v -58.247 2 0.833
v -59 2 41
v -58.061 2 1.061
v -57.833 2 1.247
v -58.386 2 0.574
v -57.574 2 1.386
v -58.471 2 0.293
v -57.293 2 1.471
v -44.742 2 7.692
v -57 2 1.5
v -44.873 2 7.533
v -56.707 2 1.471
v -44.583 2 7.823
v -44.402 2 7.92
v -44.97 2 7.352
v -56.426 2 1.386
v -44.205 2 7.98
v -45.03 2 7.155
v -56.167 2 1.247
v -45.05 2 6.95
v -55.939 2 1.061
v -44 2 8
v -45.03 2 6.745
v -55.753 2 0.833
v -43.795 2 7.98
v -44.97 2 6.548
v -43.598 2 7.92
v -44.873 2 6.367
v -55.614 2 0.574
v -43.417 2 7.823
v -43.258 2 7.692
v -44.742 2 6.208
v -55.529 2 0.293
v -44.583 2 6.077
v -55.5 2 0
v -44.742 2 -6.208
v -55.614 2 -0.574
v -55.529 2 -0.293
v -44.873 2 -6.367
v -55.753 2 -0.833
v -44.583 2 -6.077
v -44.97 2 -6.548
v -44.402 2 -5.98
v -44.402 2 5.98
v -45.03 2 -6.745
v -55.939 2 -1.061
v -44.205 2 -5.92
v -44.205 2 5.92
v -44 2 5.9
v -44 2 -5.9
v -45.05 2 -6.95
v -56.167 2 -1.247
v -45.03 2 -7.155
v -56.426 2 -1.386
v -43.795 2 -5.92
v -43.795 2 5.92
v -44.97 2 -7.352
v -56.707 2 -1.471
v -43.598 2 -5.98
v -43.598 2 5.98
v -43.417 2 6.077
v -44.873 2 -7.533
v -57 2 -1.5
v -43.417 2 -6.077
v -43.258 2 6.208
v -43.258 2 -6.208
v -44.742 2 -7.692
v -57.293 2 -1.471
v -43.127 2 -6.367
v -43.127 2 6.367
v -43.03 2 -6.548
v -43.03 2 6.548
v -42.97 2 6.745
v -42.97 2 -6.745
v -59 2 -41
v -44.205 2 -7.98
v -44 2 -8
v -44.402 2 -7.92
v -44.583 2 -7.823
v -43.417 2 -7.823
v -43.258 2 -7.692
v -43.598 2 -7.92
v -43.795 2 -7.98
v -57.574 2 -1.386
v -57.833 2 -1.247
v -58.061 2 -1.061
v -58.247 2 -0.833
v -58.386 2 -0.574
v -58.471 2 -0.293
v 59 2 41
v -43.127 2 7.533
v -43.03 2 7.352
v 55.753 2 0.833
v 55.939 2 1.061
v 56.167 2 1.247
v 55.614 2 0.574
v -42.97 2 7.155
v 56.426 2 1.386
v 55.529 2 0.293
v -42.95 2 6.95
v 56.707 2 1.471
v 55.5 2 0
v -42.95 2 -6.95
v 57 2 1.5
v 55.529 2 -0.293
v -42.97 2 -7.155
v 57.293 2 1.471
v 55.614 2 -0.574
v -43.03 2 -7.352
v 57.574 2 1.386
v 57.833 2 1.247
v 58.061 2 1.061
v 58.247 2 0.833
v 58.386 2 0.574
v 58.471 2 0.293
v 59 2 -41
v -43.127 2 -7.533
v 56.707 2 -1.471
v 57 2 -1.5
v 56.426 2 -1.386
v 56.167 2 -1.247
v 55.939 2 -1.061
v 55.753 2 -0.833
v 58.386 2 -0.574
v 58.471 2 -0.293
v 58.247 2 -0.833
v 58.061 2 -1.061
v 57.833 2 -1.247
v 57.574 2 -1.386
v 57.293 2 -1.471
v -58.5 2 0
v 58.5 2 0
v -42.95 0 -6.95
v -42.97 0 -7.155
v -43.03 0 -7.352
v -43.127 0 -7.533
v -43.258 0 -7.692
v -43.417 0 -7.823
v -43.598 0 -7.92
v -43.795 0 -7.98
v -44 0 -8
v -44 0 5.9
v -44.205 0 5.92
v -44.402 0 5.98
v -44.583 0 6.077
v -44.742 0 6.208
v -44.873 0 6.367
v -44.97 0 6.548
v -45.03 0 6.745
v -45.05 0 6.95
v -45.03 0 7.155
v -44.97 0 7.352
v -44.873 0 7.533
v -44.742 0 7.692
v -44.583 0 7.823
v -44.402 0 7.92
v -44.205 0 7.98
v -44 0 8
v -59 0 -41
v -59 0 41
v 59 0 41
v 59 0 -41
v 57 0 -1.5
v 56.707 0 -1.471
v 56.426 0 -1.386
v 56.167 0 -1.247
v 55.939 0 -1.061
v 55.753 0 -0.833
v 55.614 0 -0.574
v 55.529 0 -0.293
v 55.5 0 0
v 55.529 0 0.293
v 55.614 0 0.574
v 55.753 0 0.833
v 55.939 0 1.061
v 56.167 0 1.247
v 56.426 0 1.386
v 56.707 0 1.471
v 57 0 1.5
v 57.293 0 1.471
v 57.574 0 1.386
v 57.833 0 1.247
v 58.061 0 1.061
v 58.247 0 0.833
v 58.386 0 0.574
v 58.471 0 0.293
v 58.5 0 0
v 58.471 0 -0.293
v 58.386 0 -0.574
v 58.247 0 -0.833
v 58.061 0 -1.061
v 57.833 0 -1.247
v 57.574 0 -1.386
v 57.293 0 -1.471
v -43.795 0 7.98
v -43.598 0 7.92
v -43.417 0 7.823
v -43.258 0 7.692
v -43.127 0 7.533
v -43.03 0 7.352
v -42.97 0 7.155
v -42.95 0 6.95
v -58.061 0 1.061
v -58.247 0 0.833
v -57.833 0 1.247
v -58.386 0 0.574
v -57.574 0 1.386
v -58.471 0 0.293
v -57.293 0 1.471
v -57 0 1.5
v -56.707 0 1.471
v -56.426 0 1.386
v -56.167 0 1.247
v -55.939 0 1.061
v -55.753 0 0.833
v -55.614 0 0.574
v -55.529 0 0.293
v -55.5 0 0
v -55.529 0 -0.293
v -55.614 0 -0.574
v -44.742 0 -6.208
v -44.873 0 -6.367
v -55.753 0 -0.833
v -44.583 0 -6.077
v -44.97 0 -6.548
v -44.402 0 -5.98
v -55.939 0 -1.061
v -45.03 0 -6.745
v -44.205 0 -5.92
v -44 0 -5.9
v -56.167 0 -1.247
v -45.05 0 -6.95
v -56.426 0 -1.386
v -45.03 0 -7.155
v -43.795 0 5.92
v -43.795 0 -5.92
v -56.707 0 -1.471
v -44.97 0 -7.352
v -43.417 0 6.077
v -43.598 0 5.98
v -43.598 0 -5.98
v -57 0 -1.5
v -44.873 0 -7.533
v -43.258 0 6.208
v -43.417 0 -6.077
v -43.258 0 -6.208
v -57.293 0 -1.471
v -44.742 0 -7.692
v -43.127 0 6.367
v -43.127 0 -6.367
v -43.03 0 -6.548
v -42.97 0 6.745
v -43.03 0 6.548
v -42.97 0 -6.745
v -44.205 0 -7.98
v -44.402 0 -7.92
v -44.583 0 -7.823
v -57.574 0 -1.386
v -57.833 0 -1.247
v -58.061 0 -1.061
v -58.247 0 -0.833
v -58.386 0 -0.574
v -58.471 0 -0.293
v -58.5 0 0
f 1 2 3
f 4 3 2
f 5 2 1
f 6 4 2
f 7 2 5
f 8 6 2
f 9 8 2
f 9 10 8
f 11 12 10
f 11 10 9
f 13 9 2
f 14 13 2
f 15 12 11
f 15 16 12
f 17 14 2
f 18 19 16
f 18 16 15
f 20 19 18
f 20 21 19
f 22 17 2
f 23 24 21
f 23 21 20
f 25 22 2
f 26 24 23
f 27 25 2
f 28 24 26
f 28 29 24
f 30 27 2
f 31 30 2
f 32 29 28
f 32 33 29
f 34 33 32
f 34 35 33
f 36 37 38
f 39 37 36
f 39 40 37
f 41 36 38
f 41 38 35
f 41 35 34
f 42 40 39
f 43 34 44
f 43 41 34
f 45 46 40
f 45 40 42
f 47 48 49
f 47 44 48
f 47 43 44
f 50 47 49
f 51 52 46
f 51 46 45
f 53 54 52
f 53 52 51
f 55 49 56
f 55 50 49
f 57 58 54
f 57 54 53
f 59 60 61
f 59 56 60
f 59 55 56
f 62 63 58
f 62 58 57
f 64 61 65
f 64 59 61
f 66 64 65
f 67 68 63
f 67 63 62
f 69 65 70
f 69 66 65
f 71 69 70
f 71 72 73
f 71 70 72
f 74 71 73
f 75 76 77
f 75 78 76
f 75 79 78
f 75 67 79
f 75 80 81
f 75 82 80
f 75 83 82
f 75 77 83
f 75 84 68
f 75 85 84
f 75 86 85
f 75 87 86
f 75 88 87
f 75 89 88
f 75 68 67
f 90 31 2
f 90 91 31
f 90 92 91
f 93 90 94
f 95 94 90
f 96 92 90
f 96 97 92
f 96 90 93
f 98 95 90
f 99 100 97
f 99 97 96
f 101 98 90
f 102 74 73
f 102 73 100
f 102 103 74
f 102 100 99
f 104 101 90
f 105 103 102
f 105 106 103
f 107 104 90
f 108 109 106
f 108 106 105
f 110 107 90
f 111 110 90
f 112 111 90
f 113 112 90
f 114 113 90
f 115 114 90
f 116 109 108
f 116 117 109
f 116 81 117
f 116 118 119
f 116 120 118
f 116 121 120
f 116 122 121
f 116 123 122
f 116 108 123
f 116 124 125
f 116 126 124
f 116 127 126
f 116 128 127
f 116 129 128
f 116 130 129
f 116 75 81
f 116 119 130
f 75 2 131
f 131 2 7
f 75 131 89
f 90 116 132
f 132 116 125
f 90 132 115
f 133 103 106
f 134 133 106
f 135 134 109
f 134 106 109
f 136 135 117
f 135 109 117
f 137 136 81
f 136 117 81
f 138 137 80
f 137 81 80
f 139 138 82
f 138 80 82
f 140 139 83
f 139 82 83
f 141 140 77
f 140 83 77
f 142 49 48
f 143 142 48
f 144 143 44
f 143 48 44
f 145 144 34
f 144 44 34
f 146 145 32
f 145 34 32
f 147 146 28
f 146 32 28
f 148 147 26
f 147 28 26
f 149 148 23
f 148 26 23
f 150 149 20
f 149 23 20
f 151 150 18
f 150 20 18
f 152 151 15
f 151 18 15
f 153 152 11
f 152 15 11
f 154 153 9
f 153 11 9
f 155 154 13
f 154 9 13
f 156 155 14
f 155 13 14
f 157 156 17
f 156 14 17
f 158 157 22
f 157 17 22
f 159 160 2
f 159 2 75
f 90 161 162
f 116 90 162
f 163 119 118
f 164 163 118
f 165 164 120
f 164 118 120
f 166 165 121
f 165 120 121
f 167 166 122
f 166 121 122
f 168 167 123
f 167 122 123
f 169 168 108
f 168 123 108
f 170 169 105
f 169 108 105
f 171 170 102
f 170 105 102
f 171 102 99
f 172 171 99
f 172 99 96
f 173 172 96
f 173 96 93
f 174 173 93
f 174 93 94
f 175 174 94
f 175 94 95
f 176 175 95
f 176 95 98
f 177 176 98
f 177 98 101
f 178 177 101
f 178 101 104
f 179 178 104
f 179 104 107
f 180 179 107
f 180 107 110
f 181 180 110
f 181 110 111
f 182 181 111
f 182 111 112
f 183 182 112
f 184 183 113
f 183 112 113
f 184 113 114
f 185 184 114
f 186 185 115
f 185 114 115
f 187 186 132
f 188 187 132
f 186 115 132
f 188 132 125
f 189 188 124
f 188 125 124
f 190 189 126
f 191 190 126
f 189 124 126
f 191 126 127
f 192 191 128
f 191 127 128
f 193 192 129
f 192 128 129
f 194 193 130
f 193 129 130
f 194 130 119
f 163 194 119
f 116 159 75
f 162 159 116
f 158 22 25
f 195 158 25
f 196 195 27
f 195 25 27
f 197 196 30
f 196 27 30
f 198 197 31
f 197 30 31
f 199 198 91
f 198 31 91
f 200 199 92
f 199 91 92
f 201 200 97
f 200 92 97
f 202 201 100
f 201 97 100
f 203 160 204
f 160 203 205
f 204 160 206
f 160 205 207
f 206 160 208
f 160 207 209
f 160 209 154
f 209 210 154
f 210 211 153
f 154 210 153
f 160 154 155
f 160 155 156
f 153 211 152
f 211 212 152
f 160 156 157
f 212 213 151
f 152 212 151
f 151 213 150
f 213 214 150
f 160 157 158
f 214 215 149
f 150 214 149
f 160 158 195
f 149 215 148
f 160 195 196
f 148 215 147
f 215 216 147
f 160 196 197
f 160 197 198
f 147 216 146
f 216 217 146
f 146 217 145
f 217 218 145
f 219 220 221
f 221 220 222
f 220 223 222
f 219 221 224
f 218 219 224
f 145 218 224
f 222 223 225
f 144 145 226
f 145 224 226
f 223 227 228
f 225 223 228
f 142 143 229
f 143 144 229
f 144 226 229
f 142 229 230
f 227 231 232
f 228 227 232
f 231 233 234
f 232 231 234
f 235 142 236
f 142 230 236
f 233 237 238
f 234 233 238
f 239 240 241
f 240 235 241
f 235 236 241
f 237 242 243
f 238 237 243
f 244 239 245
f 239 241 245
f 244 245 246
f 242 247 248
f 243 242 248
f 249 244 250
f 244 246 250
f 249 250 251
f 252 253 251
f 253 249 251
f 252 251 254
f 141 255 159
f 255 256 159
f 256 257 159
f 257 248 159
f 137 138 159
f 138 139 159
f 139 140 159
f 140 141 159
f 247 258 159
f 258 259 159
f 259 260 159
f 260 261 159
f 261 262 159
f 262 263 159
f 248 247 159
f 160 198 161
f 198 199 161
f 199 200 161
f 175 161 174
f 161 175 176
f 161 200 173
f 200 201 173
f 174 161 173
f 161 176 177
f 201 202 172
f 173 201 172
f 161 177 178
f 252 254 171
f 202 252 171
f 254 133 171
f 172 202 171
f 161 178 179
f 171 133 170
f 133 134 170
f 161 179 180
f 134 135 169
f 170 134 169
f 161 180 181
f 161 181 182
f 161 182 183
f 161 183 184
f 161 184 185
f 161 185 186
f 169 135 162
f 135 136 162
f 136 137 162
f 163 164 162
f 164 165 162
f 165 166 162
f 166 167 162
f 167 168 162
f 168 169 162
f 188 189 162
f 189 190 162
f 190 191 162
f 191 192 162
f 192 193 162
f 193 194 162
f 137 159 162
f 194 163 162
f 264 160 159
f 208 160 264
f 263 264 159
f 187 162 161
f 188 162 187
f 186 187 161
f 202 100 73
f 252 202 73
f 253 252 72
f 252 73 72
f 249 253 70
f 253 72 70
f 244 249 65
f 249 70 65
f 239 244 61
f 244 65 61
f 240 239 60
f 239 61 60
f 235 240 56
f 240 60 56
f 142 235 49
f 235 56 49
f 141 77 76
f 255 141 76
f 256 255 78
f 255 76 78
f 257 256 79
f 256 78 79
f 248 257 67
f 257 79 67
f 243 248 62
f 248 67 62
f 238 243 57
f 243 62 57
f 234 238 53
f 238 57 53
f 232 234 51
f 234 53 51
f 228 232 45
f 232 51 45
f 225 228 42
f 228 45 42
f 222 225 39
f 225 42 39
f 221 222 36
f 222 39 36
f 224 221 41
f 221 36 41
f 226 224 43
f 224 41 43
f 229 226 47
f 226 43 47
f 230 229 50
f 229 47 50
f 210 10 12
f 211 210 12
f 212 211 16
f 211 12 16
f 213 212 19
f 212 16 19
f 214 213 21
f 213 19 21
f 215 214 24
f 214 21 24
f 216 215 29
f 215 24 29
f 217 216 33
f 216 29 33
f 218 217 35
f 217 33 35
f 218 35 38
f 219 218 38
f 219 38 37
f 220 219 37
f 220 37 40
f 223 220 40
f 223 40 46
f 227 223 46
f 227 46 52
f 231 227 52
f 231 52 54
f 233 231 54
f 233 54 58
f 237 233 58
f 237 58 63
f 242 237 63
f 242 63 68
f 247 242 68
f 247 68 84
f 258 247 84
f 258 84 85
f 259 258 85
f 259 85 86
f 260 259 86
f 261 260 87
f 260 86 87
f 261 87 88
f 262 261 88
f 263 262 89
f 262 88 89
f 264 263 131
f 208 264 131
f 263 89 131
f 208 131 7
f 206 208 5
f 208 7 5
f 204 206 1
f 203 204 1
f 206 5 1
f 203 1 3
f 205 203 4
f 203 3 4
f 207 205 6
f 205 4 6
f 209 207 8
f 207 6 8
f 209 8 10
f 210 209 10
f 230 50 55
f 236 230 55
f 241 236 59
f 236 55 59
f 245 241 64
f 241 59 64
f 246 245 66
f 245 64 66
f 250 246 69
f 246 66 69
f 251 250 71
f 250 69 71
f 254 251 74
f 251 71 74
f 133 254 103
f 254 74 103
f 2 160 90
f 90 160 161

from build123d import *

# Parameters (mm, degrees)
SKETCH1_W           = 118
SKETCH1_H           = 82
BOSS_EXTRUDE1_DEPTH = 2
CUT_EXTRUDE1_DEPTH  = 2
SKETCH3_R           = 1.5
CUT_EXTRUDE2_DEPTH  = 10


with BuildPart() as part:
    # Sketch1 → Boss-Extrude1 (new body)
    with BuildSketch(Plane(origin=(0, 0, 0), x_dir=(1, 0, 0), z_dir=(0, 1, 0))):
        Rectangle(SKETCH1_W, SKETCH1_H)
    extrude(amount=BOSS_EXTRUDE1_DEPTH)

    # Sketch2 → Cut-Extrude1 (cut)
    with BuildSketch(Plane(origin=(0, 2, 0), x_dir=(1, 0, 0), z_dir=(0, 1, 0))):
        with BuildLine():
            ThreePointArc((-44, 8), (-45.05, 6.95), (-44, 5.9))
            Line((-44, 5.9), (-44, 8))
        make_face()
        with BuildLine():
            Line((-44, 8), (-44, 5.9))
            ThreePointArc((-44, 5.9), (-43.25753788, 6.20753788), (-42.95, 6.95))
            ThreePointArc((-42.95, 6.95), (-43.25753788, 7.69246212), (-44, 8))
        make_face()
        with BuildLine():
            ThreePointArc((-44, -5.9), (-45.05, -6.95), (-44, -8))
            Line((-44, -8), (-44, -5.9))
        make_face()
        with BuildLine():
            Line((-44, -5.9), (-44, -8))
            ThreePointArc((-44, -8), (-43.25753788, -7.69246212), (-42.95, -6.95))
            ThreePointArc((-42.95, -6.95), (-43.25753788, -6.20753788), (-44, -5.9))
        make_face()
    extrude(amount=-CUT_EXTRUDE1_DEPTH, mode=Mode.SUBTRACT)

    # Sketch3 → Cut-Extrude2 (cut)
    with BuildSketch(Plane(origin=(0, 2, 0), x_dir=(1, 0, 0), z_dir=(0, 1, 0))):
        with Locations(Location((-57, 0, 0), (0, 0, 270))):
            Circle(SKETCH3_R)
        with Locations(Location((57, 0, 0), (0, 0, 90))):
            Circle(SKETCH3_R)
    extrude(amount=-CUT_EXTRUDE2_DEPTH, mode=Mode.SUBTRACT)


solid = part.part
